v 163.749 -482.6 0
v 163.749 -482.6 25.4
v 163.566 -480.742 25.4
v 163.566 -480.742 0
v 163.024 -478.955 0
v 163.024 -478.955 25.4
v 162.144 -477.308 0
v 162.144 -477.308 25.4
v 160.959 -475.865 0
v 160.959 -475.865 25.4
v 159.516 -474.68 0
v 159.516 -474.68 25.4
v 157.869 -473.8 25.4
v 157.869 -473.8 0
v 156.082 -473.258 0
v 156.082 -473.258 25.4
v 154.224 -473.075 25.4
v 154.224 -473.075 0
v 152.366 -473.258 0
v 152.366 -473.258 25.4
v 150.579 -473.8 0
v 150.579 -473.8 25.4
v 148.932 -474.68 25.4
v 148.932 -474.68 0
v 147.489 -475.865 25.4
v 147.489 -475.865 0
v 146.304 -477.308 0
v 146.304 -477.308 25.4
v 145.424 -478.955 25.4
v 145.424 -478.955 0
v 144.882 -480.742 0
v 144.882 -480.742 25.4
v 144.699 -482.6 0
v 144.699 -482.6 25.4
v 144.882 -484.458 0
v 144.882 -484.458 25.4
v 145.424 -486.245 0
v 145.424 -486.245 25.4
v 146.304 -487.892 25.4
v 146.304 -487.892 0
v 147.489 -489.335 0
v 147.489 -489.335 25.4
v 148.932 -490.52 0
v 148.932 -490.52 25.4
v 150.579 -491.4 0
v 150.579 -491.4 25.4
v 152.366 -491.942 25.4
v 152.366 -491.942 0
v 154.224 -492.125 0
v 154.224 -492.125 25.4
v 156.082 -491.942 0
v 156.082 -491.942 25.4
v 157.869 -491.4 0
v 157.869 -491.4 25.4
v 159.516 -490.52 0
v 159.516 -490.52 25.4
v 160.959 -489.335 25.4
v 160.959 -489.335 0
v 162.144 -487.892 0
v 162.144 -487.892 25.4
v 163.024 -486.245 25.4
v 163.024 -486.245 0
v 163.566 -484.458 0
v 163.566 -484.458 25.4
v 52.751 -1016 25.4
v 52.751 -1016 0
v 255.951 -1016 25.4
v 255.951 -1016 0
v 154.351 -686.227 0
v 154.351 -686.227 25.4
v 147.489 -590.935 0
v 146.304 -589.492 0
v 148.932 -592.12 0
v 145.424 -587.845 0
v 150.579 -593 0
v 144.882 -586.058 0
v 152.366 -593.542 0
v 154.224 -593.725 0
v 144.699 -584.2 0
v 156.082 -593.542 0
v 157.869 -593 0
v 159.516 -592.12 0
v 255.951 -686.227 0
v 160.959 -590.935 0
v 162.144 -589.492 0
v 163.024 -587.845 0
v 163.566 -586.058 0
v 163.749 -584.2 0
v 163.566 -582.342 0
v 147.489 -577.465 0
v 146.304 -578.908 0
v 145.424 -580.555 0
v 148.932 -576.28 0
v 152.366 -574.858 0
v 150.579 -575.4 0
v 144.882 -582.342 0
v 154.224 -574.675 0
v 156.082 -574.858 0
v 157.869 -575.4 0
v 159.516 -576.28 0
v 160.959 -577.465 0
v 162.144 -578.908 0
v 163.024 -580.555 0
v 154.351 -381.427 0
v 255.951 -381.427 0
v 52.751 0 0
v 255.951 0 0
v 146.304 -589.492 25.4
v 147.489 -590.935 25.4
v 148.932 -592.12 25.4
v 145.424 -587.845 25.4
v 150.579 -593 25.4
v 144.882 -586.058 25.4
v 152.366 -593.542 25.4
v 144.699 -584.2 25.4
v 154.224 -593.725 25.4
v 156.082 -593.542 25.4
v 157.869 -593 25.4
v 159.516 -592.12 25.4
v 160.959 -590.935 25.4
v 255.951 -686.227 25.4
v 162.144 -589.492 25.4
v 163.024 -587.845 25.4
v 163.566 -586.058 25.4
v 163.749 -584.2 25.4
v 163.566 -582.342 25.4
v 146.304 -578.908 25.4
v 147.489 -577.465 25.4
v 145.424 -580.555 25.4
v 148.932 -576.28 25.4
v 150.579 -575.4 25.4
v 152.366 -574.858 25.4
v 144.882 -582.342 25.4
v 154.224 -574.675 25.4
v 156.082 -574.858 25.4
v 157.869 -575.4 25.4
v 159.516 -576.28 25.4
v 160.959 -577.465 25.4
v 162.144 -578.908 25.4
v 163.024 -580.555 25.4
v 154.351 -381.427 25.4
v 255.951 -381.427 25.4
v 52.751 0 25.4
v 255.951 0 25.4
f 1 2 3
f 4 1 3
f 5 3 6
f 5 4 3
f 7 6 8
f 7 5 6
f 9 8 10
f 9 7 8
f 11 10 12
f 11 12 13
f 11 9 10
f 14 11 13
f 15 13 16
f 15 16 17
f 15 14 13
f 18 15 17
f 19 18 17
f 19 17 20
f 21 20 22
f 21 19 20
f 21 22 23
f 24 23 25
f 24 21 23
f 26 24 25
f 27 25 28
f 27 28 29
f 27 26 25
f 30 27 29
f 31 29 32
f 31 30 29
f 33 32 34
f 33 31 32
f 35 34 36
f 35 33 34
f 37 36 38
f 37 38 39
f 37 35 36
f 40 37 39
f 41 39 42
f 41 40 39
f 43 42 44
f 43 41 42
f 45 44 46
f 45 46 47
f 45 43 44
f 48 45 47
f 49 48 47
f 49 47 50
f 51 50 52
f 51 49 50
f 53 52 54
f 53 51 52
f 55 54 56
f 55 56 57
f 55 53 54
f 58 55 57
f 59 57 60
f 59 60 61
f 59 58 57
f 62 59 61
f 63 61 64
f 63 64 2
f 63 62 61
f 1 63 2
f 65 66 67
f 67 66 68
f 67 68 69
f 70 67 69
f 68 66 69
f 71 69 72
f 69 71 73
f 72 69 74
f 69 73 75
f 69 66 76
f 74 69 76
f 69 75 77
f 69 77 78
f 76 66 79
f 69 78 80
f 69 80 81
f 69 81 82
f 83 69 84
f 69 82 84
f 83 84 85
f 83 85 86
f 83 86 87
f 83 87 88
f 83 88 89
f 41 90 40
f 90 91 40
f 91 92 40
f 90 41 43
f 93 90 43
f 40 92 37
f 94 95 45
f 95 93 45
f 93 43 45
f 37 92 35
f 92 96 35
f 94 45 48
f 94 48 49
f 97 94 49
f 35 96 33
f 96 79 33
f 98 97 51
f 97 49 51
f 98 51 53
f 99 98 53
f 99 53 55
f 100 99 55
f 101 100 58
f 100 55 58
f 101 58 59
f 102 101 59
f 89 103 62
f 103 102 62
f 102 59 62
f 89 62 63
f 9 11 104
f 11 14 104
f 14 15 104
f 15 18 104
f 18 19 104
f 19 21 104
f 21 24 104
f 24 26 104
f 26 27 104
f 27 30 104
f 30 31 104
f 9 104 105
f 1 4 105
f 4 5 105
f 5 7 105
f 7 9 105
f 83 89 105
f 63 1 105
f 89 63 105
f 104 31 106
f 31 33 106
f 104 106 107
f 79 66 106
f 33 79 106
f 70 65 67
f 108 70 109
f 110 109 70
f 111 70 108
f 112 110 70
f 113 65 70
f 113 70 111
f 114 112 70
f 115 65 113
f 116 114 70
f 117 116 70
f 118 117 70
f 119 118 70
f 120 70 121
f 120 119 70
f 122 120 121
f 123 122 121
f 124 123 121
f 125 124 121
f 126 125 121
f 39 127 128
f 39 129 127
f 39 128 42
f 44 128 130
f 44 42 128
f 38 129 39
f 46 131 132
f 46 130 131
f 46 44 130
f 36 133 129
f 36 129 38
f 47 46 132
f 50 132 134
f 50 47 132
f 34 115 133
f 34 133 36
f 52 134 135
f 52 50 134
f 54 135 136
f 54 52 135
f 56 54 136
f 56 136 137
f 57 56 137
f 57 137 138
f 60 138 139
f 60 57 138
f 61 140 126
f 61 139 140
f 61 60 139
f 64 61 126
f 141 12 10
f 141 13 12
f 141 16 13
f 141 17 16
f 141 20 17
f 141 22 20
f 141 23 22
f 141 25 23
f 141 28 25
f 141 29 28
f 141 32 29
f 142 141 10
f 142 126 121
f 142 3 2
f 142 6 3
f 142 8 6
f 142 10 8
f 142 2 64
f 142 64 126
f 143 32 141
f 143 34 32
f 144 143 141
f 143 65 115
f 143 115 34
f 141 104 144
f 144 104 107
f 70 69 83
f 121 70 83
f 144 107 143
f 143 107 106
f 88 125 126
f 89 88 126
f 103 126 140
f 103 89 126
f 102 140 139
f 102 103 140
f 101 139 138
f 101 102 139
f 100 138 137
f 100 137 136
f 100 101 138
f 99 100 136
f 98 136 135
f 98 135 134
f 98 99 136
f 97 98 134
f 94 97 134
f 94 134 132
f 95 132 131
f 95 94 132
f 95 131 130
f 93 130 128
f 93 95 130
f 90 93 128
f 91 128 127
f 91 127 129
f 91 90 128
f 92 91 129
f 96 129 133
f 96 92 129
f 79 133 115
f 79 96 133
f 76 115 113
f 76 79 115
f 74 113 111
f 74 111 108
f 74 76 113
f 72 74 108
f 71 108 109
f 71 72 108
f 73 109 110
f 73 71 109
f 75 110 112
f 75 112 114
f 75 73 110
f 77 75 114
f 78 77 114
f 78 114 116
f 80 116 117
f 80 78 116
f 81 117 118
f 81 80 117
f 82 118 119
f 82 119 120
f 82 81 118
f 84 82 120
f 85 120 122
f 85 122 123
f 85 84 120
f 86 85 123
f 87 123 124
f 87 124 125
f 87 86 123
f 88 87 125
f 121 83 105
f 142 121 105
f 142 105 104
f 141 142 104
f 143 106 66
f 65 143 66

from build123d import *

# Parameters (mm, degrees)
F1_DEPTH = 19.05
F0_R     = 9.525
F2_DEPTH = 25.4


with BuildPart() as f1:
    # F0 (on Top) → F1 (new body)
    with BuildSketch(Plane.XY):
        Polygon((154.2242345231, 0), (52.7512345231, 0), (52.7512345231, -381.426606369), (154.3512345231, -381.426606369), (255.9512345231, 0), align=None)
    extrude(amount=F1_DEPTH)

    # F0 (on Top) → F2 (join)
    with BuildSketch(Plane.XY):
        Polygon((154.2242345231, 0), (52.7512345231, 0), (52.7512345231, -381.426606369), (154.3512345231, -381.426606369), (255.9512345231, 0), align=None)
        Polygon((154.3512345231, -686.226606369), (52.7512345231, -686.226606369), (52.7512345231, -1016), (154.2242345231, -1016), (255.9512345231, -1016), align=None)
        Polygon((154.3512345231, -381.426606369), (52.7512345231, -381.426606369), (52.7512345231, -686.226606369), (154.3512345231, -686.226606369), (255.9512345231, -686.226606369), (255.9512345231, -381.426606369), align=None)
        with Locations((154.2242345231, -584.2)):
            Circle(F0_R, mode=Mode.SUBTRACT)
        with Locations((154.2242345231, -482.6)):
            Circle(F0_R, mode=Mode.SUBTRACT)
    extrude(amount=F2_DEPTH)


solid = f1.part
